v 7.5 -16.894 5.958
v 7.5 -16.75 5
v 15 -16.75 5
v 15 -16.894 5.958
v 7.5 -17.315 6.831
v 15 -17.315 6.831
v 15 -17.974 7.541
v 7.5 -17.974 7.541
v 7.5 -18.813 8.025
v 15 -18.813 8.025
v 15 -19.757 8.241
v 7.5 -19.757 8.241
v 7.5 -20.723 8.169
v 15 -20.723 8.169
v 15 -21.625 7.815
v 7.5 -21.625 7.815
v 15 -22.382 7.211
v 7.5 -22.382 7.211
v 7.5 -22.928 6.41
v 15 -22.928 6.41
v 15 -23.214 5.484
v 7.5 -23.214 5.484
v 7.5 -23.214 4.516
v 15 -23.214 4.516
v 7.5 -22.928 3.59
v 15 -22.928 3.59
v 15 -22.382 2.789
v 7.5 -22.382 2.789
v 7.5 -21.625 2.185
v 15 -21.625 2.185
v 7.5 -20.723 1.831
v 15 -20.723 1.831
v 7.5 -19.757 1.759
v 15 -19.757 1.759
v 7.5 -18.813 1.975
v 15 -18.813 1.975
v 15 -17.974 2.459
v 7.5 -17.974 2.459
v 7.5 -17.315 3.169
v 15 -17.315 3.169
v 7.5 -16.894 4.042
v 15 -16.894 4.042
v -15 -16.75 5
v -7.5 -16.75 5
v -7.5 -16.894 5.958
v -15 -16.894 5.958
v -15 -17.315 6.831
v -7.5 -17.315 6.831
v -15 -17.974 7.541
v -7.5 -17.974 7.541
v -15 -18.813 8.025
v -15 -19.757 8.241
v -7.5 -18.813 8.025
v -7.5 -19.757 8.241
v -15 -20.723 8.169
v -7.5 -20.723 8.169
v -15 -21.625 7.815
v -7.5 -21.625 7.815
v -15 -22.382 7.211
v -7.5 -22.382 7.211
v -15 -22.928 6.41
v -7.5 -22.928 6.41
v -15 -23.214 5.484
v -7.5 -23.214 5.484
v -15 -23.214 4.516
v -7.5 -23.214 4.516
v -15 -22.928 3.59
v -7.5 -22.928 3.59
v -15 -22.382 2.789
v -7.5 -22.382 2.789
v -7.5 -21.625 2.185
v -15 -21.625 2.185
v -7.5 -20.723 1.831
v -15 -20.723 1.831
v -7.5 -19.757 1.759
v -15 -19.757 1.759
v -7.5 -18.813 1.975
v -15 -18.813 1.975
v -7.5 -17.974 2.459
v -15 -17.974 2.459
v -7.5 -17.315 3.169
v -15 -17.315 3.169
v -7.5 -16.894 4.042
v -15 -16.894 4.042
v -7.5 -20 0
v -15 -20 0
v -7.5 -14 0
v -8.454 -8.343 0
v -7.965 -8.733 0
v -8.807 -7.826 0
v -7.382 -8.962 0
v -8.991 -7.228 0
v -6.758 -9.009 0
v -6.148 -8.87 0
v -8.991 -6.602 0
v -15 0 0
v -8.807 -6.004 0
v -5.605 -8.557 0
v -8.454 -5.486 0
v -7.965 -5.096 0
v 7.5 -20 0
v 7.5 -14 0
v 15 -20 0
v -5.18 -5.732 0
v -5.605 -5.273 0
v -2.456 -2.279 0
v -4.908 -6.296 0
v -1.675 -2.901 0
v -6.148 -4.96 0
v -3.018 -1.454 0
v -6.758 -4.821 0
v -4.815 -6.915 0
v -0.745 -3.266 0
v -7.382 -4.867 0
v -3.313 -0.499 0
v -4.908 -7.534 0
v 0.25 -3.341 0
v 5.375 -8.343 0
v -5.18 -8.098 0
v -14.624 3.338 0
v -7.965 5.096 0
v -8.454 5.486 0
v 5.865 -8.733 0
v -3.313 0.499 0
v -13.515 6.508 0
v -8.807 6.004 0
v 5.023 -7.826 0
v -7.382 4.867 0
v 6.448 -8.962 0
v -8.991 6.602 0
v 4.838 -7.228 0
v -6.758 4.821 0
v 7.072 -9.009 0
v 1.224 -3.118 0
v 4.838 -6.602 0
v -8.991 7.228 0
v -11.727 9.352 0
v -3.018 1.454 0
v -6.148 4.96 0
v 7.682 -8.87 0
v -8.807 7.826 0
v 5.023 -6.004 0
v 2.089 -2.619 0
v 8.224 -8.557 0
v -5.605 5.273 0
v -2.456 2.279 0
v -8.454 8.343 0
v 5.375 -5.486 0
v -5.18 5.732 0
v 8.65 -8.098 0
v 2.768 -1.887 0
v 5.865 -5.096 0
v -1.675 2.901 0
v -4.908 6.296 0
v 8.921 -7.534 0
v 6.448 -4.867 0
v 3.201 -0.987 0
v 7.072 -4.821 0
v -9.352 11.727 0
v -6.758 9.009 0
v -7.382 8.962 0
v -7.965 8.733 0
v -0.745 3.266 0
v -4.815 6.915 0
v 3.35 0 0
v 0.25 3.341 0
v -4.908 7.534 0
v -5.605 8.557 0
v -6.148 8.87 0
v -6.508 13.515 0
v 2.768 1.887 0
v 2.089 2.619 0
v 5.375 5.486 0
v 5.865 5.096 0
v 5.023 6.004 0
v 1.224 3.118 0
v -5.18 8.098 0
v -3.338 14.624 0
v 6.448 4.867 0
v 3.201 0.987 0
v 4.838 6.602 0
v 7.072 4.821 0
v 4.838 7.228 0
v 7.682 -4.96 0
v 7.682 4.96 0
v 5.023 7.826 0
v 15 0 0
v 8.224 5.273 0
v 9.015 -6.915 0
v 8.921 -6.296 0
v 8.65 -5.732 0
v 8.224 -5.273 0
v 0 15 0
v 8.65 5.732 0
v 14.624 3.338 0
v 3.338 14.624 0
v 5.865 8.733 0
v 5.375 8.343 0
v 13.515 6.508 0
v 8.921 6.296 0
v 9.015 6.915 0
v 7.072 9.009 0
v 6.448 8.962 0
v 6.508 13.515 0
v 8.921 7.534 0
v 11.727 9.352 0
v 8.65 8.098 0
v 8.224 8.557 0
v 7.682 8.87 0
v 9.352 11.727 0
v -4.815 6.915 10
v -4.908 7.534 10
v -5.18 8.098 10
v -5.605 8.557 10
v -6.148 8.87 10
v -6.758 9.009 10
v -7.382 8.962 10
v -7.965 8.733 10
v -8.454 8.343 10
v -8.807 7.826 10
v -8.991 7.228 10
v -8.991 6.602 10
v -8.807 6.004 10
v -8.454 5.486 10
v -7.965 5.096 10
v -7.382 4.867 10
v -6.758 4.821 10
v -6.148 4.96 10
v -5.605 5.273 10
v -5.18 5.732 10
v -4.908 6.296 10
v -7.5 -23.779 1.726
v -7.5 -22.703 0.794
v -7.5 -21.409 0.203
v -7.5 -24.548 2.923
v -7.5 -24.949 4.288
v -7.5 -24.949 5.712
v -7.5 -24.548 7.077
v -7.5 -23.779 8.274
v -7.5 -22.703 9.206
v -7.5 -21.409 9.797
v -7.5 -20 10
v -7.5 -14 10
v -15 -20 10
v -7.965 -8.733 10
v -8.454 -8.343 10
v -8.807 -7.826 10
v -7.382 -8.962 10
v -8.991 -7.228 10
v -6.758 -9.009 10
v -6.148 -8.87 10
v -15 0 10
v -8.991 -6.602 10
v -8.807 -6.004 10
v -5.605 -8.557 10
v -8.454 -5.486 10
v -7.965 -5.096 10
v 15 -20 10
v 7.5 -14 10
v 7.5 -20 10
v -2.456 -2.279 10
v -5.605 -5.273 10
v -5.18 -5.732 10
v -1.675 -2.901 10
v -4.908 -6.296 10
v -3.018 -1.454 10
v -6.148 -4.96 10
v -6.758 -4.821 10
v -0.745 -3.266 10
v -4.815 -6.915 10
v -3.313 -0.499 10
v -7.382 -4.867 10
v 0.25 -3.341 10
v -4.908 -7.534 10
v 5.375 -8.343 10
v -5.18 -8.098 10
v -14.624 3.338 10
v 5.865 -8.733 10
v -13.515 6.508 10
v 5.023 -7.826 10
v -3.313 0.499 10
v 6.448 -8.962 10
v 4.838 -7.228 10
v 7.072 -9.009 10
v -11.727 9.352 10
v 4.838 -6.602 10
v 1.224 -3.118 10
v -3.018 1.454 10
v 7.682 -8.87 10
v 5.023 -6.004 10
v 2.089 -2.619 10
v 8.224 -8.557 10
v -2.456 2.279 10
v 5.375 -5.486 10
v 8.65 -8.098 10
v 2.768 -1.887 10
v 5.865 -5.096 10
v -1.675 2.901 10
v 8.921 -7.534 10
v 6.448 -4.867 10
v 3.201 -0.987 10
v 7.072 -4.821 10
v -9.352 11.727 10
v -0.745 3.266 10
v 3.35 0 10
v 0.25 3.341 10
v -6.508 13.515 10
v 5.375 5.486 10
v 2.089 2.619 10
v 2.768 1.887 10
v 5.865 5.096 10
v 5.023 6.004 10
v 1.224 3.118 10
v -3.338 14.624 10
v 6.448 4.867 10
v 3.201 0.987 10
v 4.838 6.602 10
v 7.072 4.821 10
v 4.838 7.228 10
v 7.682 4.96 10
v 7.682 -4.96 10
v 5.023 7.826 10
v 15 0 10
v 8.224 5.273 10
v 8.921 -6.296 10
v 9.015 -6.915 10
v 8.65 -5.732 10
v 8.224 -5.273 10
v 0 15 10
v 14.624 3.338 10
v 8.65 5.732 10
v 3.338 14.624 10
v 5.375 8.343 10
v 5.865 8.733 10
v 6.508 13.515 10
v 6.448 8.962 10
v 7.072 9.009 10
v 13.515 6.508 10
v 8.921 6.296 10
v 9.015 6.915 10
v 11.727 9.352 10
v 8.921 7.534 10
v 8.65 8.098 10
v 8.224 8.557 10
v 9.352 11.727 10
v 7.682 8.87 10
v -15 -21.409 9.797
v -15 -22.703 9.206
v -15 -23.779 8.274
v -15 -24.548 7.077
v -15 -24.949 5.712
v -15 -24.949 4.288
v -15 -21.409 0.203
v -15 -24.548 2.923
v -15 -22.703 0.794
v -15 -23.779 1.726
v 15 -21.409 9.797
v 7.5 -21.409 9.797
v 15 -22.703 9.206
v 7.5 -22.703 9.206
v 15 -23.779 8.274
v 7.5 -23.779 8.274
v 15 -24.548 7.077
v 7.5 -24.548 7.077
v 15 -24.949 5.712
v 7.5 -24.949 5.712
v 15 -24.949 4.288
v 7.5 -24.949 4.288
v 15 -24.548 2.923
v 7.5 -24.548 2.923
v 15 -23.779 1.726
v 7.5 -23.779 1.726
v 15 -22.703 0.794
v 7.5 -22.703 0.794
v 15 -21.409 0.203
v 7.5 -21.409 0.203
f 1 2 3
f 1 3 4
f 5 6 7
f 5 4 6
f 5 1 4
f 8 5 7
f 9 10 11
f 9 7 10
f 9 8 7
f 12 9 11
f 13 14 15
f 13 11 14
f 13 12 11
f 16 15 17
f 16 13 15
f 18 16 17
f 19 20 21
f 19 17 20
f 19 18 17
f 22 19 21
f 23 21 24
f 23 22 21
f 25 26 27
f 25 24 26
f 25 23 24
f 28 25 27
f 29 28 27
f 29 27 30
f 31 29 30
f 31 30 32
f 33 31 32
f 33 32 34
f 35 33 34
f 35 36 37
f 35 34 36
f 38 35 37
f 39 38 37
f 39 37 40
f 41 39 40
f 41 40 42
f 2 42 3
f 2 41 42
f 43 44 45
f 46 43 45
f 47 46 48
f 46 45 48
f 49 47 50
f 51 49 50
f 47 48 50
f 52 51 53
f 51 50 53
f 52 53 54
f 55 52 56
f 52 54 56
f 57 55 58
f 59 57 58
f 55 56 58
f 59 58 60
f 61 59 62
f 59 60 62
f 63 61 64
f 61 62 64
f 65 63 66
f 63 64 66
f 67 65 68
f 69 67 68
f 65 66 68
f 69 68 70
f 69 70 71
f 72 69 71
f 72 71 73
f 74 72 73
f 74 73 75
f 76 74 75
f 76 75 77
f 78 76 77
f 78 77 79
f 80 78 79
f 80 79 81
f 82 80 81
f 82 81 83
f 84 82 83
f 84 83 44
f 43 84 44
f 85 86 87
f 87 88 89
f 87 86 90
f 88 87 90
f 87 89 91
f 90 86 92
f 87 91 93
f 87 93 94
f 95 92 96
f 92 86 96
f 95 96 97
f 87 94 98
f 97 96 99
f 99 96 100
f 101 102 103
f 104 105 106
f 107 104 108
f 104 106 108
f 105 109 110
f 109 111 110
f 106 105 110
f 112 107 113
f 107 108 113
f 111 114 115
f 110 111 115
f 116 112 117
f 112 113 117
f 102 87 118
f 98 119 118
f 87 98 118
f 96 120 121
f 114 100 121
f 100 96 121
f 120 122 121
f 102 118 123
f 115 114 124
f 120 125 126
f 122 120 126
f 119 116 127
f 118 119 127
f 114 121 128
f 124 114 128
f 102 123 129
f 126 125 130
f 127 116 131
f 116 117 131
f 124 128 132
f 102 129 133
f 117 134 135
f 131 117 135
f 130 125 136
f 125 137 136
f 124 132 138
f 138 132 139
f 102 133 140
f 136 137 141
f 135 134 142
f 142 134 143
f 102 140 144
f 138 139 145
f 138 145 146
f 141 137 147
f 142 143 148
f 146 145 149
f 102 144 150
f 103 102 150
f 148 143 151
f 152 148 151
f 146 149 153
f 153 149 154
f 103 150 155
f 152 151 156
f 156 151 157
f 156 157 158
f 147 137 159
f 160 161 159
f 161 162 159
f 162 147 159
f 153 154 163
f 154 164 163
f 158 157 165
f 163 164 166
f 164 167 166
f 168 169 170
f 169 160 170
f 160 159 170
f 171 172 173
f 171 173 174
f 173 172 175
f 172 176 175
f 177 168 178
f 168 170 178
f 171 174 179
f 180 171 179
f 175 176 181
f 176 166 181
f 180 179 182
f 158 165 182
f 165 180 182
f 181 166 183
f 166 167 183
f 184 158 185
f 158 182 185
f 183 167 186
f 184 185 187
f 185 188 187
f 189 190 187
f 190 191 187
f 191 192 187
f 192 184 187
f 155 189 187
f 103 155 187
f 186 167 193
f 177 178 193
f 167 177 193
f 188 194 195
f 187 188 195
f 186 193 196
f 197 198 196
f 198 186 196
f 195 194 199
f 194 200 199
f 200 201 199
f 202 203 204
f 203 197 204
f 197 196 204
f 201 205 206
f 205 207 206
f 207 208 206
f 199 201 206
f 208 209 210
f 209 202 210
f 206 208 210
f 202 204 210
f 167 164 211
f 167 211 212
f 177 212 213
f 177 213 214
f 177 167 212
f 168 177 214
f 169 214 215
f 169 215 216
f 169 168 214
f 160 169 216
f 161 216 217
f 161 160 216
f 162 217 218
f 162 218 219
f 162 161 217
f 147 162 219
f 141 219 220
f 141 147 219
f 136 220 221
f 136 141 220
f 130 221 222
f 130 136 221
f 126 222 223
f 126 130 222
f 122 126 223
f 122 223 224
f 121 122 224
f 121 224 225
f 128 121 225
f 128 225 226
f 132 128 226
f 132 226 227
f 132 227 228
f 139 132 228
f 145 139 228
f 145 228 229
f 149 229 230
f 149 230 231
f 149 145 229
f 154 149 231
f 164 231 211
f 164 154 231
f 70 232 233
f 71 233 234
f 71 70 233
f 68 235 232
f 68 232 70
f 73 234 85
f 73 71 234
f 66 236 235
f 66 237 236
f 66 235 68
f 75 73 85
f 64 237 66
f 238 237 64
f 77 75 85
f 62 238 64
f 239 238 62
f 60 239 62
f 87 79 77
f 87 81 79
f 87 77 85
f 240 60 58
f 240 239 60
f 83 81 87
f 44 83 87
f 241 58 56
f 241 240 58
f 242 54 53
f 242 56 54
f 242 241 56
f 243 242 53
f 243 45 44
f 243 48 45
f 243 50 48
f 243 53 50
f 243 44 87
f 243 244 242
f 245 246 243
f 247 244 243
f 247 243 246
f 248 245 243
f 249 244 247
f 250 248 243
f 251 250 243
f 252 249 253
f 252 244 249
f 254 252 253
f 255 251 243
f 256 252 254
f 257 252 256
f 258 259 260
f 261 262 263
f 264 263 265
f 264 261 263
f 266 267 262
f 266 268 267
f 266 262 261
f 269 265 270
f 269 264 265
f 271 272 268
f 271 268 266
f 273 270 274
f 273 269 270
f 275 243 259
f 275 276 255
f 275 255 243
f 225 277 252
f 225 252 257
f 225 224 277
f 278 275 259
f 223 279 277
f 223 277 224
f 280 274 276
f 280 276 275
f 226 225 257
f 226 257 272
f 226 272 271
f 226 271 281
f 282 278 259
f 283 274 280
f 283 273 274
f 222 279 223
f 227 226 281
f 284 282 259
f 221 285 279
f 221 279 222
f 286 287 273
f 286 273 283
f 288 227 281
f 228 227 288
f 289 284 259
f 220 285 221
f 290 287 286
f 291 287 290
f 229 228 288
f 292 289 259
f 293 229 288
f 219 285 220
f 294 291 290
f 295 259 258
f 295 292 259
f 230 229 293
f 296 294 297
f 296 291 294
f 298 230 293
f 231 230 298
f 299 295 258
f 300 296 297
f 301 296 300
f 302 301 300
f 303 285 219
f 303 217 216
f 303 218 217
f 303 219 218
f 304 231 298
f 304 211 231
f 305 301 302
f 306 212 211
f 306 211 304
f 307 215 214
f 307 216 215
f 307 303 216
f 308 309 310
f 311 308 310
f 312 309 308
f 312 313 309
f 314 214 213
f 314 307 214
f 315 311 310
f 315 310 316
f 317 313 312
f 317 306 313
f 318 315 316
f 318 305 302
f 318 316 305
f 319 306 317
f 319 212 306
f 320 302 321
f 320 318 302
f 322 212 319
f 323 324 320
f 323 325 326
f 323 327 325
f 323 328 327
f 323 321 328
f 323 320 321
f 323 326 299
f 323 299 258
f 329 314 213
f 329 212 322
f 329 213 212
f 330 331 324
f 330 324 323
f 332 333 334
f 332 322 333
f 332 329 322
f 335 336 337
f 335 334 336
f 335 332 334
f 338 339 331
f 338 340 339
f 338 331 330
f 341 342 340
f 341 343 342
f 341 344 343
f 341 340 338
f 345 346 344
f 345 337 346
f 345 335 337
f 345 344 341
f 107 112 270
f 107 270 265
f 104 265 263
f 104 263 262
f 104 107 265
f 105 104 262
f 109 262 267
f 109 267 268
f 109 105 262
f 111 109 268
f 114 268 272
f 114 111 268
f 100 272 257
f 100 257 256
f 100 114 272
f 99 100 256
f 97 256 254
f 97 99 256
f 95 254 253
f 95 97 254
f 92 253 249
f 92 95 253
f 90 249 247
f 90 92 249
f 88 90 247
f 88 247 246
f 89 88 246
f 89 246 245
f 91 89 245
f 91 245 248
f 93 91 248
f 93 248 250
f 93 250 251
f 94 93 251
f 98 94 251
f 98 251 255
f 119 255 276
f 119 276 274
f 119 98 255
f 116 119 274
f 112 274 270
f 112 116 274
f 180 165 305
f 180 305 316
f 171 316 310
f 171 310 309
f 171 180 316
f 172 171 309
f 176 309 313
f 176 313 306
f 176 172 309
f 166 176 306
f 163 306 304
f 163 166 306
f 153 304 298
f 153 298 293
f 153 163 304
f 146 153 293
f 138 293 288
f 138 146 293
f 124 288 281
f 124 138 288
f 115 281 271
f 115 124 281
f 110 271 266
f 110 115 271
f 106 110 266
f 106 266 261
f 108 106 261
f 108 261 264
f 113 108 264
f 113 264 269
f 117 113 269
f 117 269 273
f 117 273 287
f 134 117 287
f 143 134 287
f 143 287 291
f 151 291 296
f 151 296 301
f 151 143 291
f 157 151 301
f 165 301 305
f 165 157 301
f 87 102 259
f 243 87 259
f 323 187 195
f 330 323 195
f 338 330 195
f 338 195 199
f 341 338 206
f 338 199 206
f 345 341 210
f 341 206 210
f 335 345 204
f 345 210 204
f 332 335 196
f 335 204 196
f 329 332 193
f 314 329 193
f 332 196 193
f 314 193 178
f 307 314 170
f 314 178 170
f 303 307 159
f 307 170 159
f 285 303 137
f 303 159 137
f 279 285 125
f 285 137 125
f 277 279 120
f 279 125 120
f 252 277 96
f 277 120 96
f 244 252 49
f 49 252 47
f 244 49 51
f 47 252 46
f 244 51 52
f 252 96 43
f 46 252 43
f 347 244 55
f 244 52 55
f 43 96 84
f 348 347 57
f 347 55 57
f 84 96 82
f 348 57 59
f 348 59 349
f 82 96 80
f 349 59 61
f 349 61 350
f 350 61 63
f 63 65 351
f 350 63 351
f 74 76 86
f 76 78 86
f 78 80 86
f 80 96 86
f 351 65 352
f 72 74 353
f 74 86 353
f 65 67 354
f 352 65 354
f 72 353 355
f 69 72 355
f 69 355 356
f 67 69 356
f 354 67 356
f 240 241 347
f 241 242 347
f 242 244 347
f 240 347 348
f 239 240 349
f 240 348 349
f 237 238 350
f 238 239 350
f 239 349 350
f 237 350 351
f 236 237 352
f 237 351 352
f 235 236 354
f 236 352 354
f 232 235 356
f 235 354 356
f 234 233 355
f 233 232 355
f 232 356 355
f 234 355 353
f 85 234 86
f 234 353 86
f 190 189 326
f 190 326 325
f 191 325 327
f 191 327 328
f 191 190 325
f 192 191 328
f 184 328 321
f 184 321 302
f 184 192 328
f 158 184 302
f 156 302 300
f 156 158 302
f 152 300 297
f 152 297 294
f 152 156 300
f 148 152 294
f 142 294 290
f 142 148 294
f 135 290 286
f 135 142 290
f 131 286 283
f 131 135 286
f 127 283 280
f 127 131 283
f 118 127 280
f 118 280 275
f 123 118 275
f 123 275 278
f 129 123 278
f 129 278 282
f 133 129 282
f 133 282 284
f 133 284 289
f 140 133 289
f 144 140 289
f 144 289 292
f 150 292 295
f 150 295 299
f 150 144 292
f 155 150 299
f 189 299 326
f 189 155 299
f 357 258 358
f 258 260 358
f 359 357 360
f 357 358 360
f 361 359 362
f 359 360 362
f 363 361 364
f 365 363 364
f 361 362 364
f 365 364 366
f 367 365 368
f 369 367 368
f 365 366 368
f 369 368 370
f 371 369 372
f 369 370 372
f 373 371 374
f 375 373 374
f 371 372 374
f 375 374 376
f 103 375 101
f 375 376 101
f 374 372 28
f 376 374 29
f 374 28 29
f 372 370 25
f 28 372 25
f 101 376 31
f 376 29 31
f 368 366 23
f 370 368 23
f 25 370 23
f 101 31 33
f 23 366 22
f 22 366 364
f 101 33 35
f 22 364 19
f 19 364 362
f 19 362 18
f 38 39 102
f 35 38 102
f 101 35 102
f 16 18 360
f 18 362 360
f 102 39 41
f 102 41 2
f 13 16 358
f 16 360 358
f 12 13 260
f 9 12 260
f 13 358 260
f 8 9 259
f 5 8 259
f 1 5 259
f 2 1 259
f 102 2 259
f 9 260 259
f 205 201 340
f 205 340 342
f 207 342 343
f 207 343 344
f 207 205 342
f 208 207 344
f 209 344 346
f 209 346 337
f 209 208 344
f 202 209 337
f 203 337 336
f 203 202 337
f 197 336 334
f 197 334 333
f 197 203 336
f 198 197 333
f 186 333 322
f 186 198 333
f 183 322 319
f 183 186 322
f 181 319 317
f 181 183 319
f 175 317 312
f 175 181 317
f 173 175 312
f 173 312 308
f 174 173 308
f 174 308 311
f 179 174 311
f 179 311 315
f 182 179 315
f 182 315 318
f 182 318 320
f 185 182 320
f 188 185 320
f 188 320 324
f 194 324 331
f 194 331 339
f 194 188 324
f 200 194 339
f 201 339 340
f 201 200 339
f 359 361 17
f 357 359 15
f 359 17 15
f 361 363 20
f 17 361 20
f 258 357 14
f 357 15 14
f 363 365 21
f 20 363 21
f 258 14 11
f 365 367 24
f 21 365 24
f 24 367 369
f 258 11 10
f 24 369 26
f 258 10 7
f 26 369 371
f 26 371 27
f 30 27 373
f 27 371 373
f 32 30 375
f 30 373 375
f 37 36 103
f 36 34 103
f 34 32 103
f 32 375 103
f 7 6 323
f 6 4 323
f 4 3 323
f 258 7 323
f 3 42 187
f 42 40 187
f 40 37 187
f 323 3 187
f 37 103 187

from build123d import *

# Parameters (mm, degrees)
SKETCH002_R       = 3.35
SKETCH002_R_2     = 2.1
PAD002_DEPTH      = 10
SKETCH003_R       = 3.25
POCKET_DEPTH      = 15.001
POCKET_DEPTH_BACK = 15.001
SKETCH004_W       = 11
SKETCH004_H       = 11
POCKET001_DEPTH   = 7.5


with BuildPart() as part:
    # Sketch002 → Pad002 (new body)
    with BuildSketch(Plane.XY):
        with BuildLine():
            ThreePointArc((15, 0), (0, 15), (-15, 0))
            Line((-15, 0), (-15, -25))
            Line((-15, -25), (15, -25))
            Line((15, -25), (15, 0))
        make_face()
        Circle(SKETCH002_R, mode=Mode.SUBTRACT)
        with Locations((-6.914797, 6.914797)):
            Circle(SKETCH002_R_2, mode=Mode.SUBTRACT)
        with Locations((6.914797, 6.914797)):
            Circle(SKETCH002_R_2, mode=Mode.SUBTRACT)
        with Locations((6.914797, -6.914797)):
            Circle(SKETCH002_R_2, mode=Mode.SUBTRACT)
        with Locations((-6.914797, -6.914797)):
            Circle(SKETCH002_R_2, mode=Mode.SUBTRACT)
    extrude(amount=PAD002_DEPTH)

    # Sketch003 → Pocket (cut, two sides)
    with BuildSketch(Plane.YZ) as pocket_sk:
        with Locations((-20, 5)):
            Circle(SKETCH003_R)
        with BuildLine():
            ThreePointArc((-20, 10), (-25, 4.999992), (-19.999984, 0))
            Line((-26, 0), (-19.999984, 0))
            Line((-26, 10), (-26, 0))
            Line((-20, 10), (-26, 10))
        make_face()
    extrude(amount=-POCKET_DEPTH, mode=Mode.SUBTRACT)
    extrude(pocket_sk.sketch, amount=POCKET_DEPTH_BACK, mode=Mode.SUBTRACT)

    # Sketch004 → Pocket001 (cut, symmetric)
    with BuildSketch(Plane.YZ):
        with Locations((-19.5, 5.5)):
            Rectangle(SKETCH004_W, SKETCH004_H)
    extrude(amount=POCKET001_DEPTH, both=True, mode=Mode.SUBTRACT)


solid = part.part
